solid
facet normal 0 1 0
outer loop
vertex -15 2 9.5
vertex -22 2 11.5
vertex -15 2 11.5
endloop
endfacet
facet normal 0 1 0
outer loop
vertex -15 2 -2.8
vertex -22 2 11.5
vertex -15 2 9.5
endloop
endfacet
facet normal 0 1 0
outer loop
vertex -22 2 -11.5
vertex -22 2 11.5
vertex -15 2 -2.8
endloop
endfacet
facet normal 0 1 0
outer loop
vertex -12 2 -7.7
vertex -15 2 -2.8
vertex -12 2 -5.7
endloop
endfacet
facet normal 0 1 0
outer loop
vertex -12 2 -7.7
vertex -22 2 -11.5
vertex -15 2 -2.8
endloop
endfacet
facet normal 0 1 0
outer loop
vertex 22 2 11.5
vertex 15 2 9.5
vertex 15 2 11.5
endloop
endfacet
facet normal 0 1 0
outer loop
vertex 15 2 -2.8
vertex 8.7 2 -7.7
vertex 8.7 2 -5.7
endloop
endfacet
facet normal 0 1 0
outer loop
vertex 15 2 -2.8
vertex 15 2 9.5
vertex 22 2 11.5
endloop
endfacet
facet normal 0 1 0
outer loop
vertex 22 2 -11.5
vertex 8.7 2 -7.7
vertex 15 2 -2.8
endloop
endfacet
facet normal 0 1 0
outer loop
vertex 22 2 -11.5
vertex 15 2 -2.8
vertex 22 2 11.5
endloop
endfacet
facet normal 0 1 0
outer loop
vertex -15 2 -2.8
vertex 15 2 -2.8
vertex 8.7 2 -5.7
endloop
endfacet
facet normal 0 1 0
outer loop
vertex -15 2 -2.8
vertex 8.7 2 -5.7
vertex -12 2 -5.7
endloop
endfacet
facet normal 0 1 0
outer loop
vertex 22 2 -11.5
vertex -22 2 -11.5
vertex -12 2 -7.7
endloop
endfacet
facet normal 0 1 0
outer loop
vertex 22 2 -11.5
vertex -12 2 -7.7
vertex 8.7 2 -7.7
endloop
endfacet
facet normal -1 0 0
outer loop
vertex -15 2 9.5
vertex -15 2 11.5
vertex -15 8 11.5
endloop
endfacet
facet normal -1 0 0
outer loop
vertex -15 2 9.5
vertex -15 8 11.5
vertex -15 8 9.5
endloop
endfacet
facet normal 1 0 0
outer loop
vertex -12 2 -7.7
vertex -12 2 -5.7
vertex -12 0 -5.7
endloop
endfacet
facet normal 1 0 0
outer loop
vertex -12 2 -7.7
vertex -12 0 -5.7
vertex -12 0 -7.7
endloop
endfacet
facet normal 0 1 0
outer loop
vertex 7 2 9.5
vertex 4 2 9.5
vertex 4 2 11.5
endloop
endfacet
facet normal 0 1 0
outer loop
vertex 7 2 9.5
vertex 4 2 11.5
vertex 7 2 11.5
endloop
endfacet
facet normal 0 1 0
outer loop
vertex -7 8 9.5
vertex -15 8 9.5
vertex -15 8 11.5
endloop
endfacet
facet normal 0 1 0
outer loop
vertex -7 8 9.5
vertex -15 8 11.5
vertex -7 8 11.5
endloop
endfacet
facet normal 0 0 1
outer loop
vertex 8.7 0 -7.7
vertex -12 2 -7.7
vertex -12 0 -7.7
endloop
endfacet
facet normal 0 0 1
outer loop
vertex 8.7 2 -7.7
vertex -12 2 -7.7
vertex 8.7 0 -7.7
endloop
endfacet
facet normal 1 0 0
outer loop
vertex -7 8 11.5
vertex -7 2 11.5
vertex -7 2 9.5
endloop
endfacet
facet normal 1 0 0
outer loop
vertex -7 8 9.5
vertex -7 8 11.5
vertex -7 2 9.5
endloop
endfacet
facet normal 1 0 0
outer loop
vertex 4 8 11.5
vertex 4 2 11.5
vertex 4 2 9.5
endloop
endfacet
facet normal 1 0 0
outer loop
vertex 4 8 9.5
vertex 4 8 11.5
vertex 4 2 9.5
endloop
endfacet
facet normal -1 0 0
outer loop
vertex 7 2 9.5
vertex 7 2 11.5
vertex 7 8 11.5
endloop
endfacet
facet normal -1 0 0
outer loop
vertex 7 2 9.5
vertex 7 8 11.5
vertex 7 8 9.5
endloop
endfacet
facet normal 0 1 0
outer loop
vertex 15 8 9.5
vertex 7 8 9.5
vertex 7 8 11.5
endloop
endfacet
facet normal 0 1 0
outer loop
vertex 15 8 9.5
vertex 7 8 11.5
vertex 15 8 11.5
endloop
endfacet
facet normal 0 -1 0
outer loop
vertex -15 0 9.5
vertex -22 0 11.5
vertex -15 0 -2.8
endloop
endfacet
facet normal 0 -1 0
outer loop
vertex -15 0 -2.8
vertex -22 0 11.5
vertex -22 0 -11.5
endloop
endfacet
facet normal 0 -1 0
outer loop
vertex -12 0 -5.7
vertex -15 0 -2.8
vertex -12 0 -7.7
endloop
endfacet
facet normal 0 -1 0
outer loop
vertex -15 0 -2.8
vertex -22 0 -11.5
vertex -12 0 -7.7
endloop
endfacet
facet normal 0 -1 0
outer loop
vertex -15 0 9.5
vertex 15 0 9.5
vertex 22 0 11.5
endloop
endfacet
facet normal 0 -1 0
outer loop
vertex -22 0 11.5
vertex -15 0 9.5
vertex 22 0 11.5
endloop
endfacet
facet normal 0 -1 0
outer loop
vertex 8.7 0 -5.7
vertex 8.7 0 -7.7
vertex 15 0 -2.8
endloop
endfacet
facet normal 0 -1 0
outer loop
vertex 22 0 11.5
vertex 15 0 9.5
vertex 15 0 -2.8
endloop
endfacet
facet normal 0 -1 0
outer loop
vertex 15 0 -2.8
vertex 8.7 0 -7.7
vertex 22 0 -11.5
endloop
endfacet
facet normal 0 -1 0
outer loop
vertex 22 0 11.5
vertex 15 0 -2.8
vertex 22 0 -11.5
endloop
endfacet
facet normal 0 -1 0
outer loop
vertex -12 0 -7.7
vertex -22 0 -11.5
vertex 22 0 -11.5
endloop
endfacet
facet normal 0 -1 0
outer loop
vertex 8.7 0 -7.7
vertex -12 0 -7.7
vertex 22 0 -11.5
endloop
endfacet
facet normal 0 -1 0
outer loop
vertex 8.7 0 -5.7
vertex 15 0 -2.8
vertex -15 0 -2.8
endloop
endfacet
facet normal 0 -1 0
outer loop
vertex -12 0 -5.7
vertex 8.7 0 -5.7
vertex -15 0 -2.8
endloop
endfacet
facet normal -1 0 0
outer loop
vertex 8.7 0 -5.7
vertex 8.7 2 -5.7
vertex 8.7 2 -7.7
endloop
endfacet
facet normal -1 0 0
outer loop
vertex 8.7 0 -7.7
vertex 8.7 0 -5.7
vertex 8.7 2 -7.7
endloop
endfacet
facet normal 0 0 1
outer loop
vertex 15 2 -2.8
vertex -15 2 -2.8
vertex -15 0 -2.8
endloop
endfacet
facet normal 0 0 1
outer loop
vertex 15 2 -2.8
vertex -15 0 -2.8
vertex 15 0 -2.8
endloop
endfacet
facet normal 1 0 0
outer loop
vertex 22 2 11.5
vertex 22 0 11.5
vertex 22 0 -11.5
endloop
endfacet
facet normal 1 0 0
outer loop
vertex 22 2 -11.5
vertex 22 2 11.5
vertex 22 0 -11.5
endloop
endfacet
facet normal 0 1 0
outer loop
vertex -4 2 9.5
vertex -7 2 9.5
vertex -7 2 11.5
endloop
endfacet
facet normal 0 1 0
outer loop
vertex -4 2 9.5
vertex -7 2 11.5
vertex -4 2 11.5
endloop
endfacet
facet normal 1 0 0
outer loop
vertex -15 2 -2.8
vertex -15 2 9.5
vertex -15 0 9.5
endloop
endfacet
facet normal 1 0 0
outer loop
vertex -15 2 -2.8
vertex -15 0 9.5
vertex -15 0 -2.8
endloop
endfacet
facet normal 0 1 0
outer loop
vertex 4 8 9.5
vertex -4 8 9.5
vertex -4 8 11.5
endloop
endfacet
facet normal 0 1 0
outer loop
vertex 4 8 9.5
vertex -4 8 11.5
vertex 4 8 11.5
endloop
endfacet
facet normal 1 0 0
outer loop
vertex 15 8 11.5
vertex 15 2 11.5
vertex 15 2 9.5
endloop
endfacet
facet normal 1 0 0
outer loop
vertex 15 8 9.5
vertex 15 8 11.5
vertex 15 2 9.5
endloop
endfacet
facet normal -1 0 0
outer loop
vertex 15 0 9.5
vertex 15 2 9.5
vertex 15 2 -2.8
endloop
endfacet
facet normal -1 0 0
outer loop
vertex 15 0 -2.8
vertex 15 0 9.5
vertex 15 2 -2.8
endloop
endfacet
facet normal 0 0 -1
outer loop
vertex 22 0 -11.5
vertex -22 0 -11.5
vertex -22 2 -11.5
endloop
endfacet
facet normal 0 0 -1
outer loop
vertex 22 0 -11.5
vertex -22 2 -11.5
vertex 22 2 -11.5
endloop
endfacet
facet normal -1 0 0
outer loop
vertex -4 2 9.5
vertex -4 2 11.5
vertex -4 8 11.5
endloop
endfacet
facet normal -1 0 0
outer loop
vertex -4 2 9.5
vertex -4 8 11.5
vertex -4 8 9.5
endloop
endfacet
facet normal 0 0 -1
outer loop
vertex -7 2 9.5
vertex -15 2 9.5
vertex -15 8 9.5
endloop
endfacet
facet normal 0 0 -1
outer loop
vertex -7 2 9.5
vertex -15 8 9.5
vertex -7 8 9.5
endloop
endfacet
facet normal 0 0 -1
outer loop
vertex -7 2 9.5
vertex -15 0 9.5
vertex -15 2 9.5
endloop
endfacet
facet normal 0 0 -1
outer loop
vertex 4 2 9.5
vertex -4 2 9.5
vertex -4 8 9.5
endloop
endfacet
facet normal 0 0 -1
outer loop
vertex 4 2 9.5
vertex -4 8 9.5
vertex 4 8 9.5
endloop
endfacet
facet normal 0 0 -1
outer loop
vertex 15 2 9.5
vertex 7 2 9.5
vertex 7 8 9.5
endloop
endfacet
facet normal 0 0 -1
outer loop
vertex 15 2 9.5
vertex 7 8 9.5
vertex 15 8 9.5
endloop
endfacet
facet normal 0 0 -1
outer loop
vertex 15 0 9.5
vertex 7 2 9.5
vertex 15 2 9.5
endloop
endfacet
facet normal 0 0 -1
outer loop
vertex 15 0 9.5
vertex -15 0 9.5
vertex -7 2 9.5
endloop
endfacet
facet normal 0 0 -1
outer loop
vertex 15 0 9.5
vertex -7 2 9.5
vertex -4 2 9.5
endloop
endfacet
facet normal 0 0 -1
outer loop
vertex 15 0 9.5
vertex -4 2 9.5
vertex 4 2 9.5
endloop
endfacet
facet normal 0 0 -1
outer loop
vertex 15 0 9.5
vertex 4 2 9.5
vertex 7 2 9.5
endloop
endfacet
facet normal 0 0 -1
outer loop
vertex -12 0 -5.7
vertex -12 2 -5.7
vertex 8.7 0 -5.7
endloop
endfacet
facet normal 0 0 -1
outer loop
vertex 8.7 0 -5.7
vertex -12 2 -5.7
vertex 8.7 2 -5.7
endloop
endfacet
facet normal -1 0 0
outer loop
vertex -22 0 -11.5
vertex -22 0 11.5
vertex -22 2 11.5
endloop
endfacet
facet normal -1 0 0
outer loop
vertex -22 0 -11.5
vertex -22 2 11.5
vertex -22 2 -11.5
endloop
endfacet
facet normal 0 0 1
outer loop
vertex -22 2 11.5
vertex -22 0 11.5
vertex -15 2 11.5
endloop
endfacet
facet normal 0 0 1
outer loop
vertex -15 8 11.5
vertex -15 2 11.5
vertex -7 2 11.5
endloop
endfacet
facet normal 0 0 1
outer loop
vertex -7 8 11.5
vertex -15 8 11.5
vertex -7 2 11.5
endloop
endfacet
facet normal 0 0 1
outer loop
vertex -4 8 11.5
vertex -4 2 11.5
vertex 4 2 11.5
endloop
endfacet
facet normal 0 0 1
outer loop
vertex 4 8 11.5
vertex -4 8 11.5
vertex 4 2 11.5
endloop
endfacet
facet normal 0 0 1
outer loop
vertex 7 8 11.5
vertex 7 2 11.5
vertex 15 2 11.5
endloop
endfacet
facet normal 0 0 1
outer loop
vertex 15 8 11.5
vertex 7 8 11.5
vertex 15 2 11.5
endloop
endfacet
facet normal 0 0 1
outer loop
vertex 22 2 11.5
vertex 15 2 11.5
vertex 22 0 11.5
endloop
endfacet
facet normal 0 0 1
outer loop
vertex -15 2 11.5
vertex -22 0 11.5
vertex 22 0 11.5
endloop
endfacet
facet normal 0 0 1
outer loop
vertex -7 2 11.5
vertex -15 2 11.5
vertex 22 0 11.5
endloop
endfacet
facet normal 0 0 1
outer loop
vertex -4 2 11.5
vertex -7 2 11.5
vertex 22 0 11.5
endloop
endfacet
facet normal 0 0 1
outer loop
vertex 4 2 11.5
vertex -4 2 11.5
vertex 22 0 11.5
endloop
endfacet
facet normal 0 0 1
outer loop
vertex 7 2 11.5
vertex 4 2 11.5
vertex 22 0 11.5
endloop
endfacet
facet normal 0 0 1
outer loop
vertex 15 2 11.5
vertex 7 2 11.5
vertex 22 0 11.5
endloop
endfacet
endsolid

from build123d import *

# Parameters (mm, degrees)
SKETCH1_W           = 44
SKETCH1_H           = 23
BOSS_EXTRUDE1_DEPTH = 2
SKETCH2_W           = 20.7
SKETCH2_H           = 2
SKETCH2_W_2         = 30
SKETCH2_H_2         = 12.3
CUT_EXTRUDE1_DEPTH  = 2
SKETCH3_W           = 8
SKETCH3_H           = 2
BOSS_EXTRUDE2_DEPTH = 6


with BuildPart() as part:
    # Sketch1 → Boss-Extrude1 (new body)
    with BuildSketch(Plane(origin=(0, 0, 0), x_dir=(1, 0, 0), z_dir=(0, 1, 0))):
        Rectangle(SKETCH1_W, SKETCH1_H)
    extrude(amount=BOSS_EXTRUDE1_DEPTH)

    # Sketch2 → Cut-Extrude1 (cut)
    with BuildSketch(Plane(origin=(0, 2, 0), x_dir=(1, 0, 0), z_dir=(0, 1, 0))):
        with Locations((-1.65, 6.7)):
            Rectangle(SKETCH2_W, SKETCH2_H)
        with Locations((0, -3.35)):
            Rectangle(SKETCH2_W_2, SKETCH2_H_2)
    extrude(amount=-CUT_EXTRUDE1_DEPTH, mode=Mode.SUBTRACT)

    # Sketch3 → Boss-Extrude2 (add)
    with BuildSketch(Plane(origin=(0, 2, 0), x_dir=(1, 0, 0), z_dir=(0, 1, 0))):
        with Locations((-11, -10.5)):
            Rectangle(SKETCH3_W, SKETCH3_H)
        with Locations((0, -10.5)):
            Rectangle(SKETCH3_W, SKETCH3_H)
        with Locations((11, -10.5)):
            Rectangle(SKETCH3_W, SKETCH3_H)
    extrude(amount=BOSS_EXTRUDE2_DEPTH)


solid = part.part
